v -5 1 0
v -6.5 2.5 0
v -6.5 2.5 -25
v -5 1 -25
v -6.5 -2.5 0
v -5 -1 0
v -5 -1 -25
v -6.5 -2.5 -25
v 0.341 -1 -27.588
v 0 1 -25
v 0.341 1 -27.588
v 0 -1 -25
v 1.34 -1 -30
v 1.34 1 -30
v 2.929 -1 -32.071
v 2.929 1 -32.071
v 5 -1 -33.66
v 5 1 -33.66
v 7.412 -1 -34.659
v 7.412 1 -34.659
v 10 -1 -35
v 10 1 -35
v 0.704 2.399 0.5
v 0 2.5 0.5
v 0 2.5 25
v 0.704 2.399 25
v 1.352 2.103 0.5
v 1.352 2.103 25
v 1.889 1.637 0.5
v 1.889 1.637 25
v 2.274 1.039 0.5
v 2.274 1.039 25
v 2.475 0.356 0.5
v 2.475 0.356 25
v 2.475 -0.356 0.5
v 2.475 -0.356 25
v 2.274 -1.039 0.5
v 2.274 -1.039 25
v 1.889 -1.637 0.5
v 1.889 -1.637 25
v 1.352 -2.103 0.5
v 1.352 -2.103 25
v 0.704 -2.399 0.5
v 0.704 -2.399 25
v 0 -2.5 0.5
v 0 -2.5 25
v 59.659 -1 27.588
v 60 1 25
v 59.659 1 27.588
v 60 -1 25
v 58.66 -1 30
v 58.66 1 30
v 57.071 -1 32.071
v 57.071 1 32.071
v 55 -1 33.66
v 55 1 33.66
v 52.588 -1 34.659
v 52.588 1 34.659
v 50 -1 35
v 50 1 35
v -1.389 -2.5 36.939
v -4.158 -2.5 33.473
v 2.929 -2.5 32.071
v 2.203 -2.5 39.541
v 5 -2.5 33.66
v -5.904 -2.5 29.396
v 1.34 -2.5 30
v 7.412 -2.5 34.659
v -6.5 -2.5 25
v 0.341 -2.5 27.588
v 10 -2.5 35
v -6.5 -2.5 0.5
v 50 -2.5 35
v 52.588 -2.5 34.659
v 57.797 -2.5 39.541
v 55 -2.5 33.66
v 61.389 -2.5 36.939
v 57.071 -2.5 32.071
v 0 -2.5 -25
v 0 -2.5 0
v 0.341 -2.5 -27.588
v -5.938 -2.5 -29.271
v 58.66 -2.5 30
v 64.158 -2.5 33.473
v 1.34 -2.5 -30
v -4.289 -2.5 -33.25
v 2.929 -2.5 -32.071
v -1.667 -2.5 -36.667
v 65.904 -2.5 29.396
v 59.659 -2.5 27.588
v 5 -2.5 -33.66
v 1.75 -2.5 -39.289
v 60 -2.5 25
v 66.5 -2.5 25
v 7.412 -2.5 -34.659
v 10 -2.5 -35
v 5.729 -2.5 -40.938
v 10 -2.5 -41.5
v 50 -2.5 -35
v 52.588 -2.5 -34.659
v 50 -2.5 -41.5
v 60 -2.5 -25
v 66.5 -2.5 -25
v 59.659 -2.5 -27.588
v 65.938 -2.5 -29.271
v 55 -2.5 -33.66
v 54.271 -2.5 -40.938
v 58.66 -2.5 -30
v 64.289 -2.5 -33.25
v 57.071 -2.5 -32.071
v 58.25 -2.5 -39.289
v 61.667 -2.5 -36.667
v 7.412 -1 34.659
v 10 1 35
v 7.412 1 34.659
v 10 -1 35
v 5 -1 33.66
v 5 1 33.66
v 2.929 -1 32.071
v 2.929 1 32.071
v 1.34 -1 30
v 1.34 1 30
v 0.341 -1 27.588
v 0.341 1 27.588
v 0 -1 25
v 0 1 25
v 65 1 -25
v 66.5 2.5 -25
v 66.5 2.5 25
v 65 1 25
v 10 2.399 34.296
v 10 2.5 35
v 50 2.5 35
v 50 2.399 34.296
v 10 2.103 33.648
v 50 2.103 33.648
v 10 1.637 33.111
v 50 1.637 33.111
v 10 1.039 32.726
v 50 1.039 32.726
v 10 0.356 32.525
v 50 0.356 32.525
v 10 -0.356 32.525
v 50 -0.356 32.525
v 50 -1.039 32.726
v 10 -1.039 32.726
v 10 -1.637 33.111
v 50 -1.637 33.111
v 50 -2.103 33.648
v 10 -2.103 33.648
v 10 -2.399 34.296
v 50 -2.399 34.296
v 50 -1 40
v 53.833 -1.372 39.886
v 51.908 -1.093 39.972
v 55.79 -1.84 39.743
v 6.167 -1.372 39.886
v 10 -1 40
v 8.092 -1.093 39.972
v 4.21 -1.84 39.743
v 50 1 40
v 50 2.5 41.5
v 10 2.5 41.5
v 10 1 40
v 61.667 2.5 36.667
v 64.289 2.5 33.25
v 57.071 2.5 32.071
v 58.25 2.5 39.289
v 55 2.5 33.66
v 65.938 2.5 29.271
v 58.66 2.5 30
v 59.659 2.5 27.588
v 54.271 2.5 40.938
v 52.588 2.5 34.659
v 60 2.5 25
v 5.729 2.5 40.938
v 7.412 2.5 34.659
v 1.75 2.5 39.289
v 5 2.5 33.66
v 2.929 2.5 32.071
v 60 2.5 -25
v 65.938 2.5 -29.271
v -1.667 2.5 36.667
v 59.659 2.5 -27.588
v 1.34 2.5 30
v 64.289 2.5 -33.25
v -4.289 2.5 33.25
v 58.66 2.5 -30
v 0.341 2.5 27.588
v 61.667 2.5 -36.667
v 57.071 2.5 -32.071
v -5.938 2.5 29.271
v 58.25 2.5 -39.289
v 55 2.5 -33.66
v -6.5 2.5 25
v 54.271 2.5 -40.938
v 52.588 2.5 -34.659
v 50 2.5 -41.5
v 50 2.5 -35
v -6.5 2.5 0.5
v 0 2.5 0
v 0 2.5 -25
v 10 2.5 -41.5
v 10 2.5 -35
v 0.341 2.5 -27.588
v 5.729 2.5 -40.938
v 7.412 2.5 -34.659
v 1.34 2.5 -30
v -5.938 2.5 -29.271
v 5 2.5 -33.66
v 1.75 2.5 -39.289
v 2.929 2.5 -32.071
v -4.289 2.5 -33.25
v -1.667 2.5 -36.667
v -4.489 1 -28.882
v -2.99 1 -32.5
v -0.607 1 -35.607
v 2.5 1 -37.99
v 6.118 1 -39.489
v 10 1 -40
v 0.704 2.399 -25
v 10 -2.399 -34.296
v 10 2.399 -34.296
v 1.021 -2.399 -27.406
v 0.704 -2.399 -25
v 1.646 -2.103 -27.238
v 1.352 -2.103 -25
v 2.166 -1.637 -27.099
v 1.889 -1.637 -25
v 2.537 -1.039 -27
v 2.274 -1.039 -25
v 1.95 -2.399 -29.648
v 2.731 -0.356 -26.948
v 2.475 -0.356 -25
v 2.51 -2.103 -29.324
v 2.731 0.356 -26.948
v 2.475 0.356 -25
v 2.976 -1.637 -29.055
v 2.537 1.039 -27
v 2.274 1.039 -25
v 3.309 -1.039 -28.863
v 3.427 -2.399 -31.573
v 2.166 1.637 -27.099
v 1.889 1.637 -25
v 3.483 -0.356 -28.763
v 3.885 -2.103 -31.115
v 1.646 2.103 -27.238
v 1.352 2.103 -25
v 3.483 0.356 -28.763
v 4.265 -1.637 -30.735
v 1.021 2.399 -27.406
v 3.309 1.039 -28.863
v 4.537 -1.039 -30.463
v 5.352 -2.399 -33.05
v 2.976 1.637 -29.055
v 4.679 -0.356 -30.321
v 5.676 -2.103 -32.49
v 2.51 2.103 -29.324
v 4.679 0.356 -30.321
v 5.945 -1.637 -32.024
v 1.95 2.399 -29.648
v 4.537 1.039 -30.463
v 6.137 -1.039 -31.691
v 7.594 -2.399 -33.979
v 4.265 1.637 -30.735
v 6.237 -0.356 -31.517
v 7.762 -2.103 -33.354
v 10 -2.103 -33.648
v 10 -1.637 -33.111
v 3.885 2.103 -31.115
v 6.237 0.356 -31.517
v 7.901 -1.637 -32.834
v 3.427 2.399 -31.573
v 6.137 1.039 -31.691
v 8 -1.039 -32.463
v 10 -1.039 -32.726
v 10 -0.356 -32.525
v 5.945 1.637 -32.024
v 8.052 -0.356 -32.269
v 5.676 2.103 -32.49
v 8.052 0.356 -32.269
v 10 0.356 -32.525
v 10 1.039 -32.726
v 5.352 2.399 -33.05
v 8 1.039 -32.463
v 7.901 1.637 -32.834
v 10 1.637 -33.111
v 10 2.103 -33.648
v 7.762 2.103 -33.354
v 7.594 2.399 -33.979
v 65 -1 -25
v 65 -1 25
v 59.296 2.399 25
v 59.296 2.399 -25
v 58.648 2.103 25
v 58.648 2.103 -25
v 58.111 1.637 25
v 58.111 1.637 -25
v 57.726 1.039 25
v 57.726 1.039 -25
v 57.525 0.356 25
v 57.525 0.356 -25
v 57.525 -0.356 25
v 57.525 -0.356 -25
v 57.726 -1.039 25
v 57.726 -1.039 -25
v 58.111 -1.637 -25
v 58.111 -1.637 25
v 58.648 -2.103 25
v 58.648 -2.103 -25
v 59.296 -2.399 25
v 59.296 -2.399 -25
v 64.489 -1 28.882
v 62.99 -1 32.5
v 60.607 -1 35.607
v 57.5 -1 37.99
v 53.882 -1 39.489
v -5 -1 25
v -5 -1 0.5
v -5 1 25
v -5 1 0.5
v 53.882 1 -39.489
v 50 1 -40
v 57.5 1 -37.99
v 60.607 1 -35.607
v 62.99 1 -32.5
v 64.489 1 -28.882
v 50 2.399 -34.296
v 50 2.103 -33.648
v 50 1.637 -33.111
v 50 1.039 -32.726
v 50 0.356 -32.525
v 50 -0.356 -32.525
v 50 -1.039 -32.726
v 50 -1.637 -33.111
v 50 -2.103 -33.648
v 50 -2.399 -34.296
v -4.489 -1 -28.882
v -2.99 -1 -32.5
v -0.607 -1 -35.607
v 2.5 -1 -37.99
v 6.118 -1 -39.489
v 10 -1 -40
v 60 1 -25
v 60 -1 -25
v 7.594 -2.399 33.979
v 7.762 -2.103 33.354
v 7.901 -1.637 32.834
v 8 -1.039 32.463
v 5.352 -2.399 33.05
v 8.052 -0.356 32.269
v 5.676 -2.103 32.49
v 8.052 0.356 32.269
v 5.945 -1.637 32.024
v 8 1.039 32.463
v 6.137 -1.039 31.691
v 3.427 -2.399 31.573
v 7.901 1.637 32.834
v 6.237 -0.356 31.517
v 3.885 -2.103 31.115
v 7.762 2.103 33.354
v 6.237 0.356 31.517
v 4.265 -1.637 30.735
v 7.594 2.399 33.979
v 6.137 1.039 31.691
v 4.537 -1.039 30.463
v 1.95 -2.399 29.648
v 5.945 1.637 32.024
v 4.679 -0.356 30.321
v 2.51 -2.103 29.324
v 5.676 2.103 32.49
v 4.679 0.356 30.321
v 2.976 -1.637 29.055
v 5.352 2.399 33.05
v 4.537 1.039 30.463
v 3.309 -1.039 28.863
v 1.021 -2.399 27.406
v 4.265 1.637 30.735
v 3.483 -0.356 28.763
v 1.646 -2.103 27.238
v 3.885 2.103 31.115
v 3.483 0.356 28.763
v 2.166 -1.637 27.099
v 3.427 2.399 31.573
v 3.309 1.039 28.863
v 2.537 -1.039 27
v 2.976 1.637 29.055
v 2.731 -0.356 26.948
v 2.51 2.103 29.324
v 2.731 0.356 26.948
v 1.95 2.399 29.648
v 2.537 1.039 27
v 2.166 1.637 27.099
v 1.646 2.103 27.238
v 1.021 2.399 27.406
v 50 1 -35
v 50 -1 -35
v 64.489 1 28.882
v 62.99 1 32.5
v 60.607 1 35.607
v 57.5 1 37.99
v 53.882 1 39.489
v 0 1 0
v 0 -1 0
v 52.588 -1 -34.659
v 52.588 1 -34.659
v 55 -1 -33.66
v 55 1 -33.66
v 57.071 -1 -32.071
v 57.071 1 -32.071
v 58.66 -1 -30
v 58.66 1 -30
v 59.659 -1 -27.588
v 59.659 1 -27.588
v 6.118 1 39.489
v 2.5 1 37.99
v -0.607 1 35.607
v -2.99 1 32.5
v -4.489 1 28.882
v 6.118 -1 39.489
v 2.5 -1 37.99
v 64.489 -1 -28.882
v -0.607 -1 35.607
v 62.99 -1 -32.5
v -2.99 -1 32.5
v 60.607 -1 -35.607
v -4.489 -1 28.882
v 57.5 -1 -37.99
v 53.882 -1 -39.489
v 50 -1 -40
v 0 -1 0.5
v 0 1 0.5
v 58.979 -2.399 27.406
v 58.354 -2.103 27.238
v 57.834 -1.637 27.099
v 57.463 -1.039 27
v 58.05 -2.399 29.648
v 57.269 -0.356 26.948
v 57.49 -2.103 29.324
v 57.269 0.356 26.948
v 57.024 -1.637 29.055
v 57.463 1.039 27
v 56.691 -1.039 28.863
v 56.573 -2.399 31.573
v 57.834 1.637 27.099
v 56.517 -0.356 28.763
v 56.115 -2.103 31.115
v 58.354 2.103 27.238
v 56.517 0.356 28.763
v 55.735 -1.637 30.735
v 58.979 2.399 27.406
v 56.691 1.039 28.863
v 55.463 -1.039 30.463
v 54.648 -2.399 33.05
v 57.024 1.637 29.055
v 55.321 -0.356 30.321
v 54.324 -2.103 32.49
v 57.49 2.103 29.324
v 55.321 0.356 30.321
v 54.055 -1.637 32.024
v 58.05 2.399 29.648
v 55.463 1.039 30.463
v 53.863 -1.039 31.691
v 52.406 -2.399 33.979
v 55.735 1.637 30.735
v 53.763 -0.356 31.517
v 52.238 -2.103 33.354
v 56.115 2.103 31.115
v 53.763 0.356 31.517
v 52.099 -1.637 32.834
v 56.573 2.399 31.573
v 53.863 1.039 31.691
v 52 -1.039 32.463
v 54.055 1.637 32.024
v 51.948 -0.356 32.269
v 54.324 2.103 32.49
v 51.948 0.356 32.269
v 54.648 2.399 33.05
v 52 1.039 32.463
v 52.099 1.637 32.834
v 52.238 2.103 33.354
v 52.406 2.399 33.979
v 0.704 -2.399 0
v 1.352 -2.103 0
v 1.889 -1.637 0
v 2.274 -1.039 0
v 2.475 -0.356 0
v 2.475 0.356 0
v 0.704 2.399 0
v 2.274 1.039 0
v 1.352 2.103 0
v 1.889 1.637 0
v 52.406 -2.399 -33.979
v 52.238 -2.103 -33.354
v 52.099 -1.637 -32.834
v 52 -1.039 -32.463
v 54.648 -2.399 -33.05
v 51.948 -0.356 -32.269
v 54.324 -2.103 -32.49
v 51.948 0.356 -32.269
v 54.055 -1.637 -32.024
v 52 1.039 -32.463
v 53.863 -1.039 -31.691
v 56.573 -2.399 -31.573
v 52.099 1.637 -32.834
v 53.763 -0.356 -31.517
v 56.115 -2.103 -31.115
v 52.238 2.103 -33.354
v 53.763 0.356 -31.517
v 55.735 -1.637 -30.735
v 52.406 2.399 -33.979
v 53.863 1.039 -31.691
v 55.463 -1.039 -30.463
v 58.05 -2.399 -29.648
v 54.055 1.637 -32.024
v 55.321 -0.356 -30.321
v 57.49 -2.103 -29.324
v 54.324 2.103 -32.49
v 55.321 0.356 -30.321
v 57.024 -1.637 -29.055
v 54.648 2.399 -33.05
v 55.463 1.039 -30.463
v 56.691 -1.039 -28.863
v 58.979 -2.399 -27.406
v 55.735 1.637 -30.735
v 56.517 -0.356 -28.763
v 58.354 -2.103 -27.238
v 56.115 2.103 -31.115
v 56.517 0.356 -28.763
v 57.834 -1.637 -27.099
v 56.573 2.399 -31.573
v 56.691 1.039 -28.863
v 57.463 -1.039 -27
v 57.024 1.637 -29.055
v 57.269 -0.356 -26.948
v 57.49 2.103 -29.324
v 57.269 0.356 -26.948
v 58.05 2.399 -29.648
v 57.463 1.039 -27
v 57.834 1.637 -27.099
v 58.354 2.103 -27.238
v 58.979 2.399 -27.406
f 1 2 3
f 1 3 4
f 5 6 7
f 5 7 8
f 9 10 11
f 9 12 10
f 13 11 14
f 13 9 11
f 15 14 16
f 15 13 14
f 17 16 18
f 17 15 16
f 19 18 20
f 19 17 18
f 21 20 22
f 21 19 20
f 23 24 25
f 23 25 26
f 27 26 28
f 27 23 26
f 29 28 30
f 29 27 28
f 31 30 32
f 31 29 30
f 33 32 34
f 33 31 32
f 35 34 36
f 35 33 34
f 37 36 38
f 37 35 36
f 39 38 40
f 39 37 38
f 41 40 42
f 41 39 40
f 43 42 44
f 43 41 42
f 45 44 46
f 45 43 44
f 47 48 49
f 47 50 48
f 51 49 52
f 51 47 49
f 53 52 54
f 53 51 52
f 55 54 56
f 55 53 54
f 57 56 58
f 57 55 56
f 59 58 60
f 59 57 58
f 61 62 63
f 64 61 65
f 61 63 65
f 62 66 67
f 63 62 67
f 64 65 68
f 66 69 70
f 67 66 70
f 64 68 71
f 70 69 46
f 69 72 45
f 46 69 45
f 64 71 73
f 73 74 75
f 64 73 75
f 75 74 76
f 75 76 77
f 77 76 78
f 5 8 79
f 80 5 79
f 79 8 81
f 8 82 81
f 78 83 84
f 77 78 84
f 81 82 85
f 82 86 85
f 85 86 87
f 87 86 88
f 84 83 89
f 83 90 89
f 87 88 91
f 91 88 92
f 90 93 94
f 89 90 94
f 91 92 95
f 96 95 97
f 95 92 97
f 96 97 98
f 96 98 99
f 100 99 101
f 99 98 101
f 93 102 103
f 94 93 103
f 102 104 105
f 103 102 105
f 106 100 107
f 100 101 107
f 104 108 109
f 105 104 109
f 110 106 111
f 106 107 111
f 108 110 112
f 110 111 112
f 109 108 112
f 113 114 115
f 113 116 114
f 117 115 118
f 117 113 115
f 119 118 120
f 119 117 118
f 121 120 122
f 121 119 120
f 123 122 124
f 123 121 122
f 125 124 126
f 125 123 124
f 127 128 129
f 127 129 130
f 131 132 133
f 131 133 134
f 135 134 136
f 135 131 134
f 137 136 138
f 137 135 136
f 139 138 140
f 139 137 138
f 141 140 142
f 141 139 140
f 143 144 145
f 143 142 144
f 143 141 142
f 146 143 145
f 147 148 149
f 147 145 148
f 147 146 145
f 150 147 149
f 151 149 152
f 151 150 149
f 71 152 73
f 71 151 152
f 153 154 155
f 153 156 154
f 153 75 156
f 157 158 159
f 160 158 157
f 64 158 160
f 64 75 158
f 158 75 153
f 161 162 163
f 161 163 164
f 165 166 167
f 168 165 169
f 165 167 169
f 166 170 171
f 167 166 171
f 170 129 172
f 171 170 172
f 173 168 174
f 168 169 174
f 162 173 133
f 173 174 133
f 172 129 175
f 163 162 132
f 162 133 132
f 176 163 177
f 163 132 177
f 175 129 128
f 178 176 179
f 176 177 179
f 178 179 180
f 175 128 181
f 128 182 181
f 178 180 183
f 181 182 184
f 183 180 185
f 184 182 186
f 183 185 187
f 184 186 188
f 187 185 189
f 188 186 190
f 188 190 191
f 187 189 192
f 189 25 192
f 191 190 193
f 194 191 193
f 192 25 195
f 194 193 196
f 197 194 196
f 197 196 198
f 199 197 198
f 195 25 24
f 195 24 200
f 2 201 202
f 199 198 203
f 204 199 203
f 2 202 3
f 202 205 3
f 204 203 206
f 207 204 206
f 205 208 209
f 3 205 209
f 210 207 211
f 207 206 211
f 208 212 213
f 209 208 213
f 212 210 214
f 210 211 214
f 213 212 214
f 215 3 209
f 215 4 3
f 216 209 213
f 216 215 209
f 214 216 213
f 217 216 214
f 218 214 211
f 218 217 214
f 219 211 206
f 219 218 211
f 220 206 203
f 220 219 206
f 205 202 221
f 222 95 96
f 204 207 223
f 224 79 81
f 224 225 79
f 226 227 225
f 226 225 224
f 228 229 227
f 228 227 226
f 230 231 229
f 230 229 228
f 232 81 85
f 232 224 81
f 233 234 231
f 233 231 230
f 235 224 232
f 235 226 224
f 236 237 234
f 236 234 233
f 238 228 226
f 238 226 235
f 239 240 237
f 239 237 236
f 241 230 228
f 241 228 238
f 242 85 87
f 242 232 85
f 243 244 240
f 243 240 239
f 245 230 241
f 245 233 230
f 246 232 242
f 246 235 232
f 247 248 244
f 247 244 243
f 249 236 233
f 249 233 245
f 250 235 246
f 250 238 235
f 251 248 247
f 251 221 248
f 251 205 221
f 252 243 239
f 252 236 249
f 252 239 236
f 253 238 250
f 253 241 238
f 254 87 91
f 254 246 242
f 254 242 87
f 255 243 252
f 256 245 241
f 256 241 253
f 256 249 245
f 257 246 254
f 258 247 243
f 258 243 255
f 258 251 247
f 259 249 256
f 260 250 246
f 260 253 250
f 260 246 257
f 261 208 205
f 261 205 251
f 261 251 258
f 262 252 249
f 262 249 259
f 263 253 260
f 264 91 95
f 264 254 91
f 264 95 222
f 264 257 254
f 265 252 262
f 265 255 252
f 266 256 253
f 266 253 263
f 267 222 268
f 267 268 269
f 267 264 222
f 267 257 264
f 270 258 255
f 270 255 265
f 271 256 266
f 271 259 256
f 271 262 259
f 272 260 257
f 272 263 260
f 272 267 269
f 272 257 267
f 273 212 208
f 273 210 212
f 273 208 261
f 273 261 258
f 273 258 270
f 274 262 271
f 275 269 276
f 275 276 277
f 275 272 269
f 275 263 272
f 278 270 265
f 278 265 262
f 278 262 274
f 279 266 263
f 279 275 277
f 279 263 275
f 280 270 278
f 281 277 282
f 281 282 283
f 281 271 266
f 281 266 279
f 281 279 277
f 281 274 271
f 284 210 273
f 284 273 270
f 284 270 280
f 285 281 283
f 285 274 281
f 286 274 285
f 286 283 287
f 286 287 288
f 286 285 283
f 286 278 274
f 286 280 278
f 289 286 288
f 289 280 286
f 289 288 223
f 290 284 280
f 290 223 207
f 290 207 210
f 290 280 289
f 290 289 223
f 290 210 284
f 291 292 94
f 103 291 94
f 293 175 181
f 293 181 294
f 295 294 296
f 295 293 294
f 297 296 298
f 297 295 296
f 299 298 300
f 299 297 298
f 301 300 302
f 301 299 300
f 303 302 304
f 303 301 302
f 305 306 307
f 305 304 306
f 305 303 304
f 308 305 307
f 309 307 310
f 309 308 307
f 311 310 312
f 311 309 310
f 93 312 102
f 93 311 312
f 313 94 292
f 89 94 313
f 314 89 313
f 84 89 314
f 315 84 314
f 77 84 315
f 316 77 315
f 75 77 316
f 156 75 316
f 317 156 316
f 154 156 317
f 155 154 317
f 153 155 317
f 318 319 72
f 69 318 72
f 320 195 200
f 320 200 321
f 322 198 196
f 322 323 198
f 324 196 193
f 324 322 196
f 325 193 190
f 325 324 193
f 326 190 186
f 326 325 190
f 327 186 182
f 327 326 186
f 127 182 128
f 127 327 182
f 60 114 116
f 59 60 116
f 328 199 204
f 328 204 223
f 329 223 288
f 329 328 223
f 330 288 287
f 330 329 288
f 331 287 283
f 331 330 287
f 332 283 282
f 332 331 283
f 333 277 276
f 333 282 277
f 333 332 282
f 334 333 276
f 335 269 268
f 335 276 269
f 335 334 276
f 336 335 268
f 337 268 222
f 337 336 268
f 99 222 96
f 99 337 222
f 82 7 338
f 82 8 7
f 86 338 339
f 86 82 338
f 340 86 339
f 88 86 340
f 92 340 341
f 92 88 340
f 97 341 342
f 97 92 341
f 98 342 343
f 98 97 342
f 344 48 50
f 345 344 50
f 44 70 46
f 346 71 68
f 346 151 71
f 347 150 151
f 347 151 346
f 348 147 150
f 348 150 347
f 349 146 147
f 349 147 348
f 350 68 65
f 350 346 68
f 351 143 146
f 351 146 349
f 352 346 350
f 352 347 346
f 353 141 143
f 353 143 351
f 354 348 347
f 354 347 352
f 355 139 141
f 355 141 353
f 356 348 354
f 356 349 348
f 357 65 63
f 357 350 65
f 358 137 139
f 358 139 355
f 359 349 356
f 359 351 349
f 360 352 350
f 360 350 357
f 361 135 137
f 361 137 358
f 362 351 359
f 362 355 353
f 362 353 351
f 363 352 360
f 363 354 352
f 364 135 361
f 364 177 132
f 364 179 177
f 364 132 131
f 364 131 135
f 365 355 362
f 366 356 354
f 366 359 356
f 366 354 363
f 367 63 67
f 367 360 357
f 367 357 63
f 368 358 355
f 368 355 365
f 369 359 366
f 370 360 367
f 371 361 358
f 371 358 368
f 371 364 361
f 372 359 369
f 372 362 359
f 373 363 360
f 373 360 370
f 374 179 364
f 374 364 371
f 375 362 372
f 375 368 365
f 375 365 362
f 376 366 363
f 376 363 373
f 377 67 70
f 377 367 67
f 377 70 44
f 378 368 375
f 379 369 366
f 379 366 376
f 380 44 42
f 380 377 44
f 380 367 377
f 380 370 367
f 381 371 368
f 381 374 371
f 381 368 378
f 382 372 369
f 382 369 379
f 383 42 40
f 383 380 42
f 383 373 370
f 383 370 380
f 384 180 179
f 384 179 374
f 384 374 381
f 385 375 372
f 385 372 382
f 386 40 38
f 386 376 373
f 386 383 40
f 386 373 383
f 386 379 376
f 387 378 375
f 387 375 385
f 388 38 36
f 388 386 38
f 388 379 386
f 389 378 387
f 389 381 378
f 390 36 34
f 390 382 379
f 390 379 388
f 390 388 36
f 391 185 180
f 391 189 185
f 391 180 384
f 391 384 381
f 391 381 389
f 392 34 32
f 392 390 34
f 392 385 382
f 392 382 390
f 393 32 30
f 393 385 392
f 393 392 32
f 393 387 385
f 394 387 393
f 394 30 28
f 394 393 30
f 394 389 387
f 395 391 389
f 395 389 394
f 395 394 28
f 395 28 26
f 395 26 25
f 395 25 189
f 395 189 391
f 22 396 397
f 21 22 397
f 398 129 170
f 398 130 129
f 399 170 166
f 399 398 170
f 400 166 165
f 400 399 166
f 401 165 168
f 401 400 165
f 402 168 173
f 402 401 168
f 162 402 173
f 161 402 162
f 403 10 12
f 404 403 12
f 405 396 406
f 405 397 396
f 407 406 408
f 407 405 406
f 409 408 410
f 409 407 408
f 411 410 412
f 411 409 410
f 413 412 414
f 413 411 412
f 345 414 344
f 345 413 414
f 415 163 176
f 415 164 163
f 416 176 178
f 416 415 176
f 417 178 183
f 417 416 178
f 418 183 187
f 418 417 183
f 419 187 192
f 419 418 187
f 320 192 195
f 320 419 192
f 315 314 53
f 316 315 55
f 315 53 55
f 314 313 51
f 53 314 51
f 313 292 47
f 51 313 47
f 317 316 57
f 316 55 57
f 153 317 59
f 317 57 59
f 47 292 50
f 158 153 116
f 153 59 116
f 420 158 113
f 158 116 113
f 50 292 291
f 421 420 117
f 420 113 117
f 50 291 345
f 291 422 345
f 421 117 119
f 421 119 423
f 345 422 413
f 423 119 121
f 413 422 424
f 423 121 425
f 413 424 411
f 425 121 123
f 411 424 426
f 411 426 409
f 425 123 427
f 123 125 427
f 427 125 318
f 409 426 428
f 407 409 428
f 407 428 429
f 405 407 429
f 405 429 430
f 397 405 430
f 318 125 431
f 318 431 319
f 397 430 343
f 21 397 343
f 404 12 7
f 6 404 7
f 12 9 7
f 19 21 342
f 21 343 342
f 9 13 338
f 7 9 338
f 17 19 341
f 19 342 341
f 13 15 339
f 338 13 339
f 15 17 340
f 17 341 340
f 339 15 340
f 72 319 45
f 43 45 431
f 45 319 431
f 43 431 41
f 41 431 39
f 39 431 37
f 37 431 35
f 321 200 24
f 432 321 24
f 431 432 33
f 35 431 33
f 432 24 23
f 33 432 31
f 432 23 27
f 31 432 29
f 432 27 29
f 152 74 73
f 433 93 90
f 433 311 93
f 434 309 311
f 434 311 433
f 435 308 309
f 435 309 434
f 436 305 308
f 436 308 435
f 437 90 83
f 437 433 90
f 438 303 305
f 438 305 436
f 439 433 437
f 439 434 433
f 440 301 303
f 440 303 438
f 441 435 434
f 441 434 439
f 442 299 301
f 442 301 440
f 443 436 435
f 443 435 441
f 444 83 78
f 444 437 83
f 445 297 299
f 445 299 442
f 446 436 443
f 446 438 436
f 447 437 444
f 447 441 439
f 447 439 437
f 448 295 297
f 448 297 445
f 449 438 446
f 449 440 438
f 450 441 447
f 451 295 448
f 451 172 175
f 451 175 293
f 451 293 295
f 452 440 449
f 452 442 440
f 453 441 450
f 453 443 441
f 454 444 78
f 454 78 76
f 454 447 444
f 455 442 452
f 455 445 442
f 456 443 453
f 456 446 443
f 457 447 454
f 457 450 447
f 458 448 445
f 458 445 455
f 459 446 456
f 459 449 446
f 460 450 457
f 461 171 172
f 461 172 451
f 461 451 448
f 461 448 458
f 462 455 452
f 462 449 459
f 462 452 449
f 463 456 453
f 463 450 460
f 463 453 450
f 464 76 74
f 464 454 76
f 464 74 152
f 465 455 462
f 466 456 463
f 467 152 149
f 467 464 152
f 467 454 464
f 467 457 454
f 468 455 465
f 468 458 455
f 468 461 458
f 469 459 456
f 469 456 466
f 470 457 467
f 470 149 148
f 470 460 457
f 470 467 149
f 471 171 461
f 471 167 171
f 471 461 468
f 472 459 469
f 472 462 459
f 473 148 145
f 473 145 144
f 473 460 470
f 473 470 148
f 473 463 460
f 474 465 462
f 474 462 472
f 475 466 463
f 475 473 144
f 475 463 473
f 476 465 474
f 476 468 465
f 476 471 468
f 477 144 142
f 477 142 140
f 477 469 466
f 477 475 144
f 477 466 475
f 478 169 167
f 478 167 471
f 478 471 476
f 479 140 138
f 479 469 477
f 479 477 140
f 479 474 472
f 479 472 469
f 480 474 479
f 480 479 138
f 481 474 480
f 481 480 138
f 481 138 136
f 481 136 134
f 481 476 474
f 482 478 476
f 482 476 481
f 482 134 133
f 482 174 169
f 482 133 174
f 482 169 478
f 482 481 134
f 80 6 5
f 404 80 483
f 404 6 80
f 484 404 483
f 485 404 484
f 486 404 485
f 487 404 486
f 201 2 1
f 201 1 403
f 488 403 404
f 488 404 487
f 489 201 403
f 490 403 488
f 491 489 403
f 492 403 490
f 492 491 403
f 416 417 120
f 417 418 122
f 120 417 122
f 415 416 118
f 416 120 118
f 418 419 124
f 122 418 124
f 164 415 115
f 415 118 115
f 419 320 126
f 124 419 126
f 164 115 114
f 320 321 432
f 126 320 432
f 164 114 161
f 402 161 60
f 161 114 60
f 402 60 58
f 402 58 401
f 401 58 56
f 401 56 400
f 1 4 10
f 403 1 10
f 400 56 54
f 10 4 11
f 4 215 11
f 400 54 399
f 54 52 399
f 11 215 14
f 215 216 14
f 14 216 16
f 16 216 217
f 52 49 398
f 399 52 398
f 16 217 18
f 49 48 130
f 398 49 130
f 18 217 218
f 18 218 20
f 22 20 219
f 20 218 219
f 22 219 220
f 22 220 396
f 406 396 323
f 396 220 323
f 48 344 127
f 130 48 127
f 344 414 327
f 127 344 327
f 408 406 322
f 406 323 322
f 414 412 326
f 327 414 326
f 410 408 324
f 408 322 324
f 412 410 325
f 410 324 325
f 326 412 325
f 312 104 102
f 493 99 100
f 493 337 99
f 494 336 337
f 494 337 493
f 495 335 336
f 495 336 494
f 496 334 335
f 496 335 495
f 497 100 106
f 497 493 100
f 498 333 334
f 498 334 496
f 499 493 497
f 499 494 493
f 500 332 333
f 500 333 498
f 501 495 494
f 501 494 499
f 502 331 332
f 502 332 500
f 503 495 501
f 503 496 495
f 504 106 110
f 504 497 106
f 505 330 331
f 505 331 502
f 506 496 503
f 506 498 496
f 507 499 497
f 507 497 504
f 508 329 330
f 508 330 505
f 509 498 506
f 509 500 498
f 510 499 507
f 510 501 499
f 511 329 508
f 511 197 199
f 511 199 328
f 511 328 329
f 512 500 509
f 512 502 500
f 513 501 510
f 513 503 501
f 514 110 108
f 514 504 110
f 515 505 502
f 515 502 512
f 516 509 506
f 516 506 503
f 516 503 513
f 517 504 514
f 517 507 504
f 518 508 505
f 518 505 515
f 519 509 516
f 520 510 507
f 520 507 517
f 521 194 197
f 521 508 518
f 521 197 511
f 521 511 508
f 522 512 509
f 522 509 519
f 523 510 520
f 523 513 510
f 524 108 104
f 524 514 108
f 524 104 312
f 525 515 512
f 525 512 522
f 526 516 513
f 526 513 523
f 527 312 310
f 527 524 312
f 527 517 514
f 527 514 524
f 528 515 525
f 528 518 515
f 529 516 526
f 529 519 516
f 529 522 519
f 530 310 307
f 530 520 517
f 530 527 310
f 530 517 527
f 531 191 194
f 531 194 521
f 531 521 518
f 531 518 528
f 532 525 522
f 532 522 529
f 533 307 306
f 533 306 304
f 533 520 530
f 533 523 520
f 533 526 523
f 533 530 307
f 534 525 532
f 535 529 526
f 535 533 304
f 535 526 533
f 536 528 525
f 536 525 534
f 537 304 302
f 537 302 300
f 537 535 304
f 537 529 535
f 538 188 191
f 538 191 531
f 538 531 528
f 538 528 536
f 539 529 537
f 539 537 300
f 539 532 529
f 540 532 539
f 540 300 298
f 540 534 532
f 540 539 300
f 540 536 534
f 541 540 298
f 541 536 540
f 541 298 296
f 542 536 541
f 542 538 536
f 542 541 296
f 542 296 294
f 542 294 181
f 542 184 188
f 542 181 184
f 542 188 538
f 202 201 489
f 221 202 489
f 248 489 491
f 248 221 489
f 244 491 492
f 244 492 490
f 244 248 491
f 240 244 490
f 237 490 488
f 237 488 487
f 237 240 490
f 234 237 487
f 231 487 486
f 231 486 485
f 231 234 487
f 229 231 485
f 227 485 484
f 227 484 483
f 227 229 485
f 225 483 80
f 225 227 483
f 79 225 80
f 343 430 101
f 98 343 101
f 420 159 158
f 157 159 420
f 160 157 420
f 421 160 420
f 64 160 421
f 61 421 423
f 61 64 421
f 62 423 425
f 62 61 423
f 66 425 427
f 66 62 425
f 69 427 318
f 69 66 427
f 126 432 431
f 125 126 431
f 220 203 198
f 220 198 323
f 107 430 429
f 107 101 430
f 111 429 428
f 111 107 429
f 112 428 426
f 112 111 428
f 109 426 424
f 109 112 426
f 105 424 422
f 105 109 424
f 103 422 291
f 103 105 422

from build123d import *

# Parameters (mm, degrees)
ENL_V_MAT_EXTRU_1_DEPTH      = 79.42671739
ENL_V_MAT_EXTRU_1_DEPTH_BACK = 79.42671739


with BuildPart() as part:
    # Balayage1: sweep along a path in Esquisse2
    with BuildLine(Plane(origin=(0, 0, 0), x_dir=(1, 0, 0), z_dir=(0, 1, 0))) as balayage1_path:
        Line((0, 0), (0, 25))
        ThreePointArc((0, 25), (2.928932188, 32.071067812), (10, 35))
        Line((10, 35), (50, 35))
        ThreePointArc((50, 35), (57.071067812, 32.071067812), (60, 25))
        Line((60, 25), (60, -25))
        ThreePointArc((60, -25), (57.071067812, -32.071067812), (50, -35))
        Line((50, -35), (10, -35))
        ThreePointArc((10, -35), (2.928932188, -32.071067812), (0, -25))
        Line((0, -25), (0, -0.5))
    # Esquisse1 → Balayage1 (sweep)
    with BuildSketch(Plane.XY):
        with BuildLine():
            Line((0, -1), (0, 1))
            Line((0, 1), (-5, 1))
            Line((-5, 1), (-6.5, 2.5))
            Line((-6.5, 2.5), (0, 2.5))
            ThreePointArc((0, 2.5), (2.5, 0), (0, -2.5))
            Line((0, -2.5), (-6.5, -2.5))
            Line((-6.5, -2.5), (-5, -1))
            Line((-5, -1), (0, -1))
        make_face()
    sweep(path=balayage1_path.line)

    # Esquisse3 → Enlèv. mat.-Extru.1 (cut, two sides: drawn at the far end of the back side and taken through both)
    with BuildSketch(Plane(origin=(0, 0, 0), x_dir=(0, 0, -1), z_dir=(1, 0, 0)).offset(-ENL_V_MAT_EXTRU_1_DEPTH_BACK)):
        Polygon((-40, -1), (-43.95658592, -1), (-43.95658592, -4.130810218), (-39.042815259, -4.130810218), align=None)
    extrude(amount=ENL_V_MAT_EXTRU_1_DEPTH + ENL_V_MAT_EXTRU_1_DEPTH_BACK, mode=Mode.SUBTRACT)


solid = part.part
